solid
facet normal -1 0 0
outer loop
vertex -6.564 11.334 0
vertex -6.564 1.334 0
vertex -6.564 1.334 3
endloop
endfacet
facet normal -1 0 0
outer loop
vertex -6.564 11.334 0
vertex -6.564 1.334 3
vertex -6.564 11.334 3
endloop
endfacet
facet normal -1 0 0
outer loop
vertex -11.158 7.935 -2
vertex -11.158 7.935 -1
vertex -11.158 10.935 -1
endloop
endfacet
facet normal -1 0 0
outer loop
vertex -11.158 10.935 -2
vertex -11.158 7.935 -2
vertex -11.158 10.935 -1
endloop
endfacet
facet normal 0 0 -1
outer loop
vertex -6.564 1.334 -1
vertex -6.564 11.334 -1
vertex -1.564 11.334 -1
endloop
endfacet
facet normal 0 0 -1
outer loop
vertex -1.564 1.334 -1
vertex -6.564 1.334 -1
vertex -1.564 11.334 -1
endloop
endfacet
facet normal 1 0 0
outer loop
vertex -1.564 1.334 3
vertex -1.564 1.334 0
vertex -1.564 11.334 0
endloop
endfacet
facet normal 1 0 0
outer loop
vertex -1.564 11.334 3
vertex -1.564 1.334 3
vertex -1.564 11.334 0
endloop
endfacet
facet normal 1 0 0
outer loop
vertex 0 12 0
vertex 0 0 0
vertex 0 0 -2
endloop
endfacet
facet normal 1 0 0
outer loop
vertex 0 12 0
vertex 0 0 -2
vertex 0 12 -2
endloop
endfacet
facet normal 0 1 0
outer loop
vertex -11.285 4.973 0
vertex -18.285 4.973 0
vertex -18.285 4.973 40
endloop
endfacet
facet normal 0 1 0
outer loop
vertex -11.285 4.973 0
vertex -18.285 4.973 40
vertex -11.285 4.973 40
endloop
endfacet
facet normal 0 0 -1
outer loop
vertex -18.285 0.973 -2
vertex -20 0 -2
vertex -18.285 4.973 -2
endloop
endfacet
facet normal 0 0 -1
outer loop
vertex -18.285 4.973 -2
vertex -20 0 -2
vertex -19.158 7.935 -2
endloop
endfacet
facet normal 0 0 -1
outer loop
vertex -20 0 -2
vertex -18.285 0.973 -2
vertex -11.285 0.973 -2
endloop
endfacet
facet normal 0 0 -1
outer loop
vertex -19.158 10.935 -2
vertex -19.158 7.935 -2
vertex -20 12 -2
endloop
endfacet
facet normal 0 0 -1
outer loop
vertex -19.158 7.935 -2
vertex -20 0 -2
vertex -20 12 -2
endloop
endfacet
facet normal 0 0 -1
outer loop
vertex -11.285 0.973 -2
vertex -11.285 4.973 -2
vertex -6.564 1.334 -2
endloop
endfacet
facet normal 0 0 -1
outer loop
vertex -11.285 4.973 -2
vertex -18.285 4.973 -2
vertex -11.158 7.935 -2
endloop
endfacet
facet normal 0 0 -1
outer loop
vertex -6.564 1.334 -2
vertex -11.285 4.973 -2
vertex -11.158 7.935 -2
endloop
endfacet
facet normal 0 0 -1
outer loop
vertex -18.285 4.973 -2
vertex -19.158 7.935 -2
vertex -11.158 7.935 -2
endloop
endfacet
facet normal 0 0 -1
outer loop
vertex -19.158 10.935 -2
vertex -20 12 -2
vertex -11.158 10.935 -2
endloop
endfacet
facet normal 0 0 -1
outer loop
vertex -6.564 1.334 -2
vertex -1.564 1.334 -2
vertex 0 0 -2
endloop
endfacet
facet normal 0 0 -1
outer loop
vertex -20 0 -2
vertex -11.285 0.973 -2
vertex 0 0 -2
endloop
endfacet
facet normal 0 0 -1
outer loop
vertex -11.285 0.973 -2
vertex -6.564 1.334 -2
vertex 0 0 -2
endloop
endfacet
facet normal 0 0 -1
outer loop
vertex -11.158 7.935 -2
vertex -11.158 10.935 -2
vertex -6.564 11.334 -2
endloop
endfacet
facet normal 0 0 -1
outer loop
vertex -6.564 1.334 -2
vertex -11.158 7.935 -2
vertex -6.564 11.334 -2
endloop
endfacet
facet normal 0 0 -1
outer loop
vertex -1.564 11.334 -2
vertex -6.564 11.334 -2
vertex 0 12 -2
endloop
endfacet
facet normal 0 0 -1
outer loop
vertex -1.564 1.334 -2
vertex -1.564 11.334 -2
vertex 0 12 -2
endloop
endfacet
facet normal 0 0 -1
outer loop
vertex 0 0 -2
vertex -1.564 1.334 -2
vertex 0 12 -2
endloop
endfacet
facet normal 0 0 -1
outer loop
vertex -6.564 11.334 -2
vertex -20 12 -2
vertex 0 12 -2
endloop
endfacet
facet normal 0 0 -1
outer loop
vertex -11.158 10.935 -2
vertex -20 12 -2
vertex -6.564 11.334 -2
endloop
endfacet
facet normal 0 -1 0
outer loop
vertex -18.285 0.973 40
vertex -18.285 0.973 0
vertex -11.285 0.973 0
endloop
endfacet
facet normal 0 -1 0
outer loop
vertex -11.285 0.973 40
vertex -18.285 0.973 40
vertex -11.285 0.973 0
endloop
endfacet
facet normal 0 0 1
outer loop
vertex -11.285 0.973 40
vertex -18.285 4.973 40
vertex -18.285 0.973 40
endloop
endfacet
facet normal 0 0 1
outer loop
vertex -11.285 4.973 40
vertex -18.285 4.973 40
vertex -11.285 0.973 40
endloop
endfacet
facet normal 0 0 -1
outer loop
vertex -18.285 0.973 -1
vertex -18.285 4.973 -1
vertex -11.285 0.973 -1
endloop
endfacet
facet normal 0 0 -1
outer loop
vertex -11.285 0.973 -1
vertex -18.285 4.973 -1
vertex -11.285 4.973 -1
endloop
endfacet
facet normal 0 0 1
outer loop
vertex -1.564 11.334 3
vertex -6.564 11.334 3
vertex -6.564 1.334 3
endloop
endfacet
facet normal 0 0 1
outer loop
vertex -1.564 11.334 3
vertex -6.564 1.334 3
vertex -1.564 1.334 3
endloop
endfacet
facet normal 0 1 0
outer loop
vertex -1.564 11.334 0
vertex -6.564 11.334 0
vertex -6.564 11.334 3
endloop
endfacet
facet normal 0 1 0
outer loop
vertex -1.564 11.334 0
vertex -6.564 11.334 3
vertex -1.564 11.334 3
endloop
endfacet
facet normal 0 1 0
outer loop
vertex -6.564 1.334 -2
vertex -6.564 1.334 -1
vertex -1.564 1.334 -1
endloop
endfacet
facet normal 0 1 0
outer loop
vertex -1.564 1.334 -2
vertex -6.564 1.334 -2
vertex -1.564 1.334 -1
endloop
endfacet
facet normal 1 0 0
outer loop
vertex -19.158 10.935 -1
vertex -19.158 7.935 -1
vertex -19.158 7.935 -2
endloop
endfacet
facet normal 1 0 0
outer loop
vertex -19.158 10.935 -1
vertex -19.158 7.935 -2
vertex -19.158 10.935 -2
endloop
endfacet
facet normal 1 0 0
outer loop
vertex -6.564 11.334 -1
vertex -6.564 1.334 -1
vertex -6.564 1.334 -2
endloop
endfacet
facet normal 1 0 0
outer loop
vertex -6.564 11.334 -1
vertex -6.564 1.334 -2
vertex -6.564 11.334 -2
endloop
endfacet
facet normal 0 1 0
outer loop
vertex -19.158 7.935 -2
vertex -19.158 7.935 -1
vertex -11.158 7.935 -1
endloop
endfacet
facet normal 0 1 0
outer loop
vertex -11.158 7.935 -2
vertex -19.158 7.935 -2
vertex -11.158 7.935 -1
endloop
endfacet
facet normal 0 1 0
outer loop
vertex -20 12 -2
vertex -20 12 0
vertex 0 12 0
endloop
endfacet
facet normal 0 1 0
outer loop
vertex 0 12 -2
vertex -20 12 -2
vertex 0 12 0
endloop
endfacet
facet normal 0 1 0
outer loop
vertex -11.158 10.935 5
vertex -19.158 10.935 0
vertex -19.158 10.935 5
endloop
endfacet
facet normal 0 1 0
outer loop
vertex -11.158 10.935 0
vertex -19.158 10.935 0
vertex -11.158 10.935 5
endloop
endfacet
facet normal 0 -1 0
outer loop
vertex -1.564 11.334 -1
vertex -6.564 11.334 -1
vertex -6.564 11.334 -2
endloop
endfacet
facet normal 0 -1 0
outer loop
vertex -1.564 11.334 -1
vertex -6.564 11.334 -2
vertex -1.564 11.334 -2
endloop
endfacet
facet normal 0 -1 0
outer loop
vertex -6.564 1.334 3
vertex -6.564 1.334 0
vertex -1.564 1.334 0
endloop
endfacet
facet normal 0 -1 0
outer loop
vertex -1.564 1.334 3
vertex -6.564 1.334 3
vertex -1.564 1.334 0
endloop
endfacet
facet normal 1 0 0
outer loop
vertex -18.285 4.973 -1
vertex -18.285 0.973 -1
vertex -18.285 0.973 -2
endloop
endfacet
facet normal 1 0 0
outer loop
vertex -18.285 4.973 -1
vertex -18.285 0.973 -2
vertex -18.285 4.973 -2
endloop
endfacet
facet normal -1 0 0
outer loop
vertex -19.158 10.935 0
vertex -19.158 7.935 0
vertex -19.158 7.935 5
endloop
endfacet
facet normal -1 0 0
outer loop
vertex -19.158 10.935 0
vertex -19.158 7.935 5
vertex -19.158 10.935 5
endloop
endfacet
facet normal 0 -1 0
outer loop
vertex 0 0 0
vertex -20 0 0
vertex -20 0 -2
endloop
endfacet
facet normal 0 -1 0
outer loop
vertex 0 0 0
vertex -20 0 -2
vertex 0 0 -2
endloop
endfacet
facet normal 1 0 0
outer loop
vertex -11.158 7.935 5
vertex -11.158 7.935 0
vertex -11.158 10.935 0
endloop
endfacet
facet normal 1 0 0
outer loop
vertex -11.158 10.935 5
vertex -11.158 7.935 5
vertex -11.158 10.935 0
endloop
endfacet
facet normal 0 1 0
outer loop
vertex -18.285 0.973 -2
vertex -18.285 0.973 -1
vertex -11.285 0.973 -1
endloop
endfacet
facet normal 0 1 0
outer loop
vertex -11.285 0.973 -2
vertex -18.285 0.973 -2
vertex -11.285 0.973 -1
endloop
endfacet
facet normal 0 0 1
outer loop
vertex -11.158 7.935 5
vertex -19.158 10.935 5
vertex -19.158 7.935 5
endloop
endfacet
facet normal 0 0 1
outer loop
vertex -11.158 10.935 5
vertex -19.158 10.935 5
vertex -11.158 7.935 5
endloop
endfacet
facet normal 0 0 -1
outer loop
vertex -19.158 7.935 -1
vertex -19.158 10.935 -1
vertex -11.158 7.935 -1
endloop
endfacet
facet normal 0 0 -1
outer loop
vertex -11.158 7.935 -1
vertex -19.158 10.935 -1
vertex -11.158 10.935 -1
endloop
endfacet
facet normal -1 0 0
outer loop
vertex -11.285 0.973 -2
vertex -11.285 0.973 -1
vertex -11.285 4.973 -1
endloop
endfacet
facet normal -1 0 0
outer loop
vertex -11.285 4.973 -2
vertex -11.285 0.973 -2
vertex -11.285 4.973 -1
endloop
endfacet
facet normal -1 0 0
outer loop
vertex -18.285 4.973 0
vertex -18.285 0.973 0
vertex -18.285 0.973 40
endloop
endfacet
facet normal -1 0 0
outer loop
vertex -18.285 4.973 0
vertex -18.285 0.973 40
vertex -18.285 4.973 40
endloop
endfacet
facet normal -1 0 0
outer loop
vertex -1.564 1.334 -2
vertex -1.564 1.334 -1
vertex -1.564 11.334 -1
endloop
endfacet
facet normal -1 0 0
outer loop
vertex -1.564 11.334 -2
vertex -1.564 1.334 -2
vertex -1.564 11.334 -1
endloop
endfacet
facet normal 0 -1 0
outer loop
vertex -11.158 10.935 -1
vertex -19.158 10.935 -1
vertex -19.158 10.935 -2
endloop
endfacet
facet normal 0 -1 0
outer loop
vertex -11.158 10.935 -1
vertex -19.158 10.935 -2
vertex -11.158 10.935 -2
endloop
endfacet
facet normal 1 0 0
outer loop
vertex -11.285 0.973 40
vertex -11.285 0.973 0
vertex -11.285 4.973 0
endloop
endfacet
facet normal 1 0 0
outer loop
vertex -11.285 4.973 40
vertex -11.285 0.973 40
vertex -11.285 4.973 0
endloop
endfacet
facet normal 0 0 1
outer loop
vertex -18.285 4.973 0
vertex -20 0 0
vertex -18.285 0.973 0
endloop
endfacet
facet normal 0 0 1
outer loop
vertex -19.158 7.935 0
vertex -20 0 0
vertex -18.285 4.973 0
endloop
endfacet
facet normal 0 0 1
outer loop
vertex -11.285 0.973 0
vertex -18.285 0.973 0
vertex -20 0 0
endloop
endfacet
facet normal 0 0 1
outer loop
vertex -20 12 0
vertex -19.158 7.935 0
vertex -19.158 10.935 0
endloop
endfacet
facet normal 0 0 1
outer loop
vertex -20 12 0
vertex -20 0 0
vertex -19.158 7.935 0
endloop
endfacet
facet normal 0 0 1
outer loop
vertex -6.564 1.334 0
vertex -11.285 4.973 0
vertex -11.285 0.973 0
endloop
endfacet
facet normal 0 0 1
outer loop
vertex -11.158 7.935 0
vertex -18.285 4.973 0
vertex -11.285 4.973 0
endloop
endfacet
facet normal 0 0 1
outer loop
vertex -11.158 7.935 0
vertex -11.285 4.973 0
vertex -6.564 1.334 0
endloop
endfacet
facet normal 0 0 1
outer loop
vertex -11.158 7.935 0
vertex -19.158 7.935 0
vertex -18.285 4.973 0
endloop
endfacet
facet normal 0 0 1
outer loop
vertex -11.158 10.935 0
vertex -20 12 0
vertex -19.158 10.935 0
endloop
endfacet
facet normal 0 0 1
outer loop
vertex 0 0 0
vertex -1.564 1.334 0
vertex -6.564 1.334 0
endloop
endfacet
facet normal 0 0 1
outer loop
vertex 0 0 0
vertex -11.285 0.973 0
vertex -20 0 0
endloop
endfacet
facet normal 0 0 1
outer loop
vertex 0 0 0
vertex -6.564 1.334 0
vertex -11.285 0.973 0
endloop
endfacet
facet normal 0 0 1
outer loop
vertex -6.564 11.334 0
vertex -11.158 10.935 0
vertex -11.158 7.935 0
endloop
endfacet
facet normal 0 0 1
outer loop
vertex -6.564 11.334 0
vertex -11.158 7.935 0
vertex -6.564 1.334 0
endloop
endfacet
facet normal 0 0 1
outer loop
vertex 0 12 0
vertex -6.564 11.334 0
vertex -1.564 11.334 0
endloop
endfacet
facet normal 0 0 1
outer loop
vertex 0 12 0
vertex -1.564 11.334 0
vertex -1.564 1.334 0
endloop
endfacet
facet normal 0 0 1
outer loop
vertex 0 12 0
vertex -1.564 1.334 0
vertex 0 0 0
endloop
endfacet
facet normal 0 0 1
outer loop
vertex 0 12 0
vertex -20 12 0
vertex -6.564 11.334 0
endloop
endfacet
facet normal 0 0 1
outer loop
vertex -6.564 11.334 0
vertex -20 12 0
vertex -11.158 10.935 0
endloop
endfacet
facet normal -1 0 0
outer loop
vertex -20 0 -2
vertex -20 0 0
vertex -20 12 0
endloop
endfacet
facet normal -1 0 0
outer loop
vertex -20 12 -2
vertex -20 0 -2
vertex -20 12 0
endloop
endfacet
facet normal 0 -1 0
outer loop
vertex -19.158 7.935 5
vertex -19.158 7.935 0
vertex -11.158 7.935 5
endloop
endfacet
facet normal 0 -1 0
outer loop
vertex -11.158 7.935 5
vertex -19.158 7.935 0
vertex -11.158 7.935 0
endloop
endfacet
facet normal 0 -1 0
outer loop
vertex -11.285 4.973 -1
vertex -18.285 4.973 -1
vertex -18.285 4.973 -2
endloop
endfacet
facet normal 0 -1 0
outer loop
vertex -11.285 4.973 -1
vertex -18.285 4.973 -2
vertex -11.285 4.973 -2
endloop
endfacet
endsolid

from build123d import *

# Parameters (mm, degrees)
F0_W     = 8
F0_H     = 3
F1_DEPTH = 5
F0_W_2   = 7
F0_H_2   = 4
F2_DEPTH = 40
F0_W_3   = 5
F0_H_3   = 10
F3_DEPTH = 3
F0_W_4   = 20
F0_H_4   = 12
F4_DEPTH = 2
F5_DEPTH = 1


with BuildPart() as f1:
    # F0 (on Top) → F1 (new body)
    with BuildSketch(Plane.XY):
        with Locations((-15.1580379307, 9.4352371395)):
            Rectangle(F0_W, F0_H)
    extrude(amount=F1_DEPTH)



with BuildPart() as f2:
    # F0 (on Top) → F2 (new body)
    with BuildSketch(Plane.XY):
        with Locations((-14.7853907049, 2.9733350016)):
            Rectangle(F0_W_2, F0_H_2)
    extrude(amount=F2_DEPTH)


with BuildPart() as f3:
    # F0 (on Top) → F3 (new body)
    with BuildSketch(Plane.XY):
        with Locations((-4.0641951468, 6.3341652229)):
            Rectangle(F0_W_3, F0_H_3)
    extrude(amount=F3_DEPTH)


with BuildPart() as f1_1:
    add(f1.part)

    add(f2.part)  # F4 merges F2

    add(f3.part)  # F4 merges F3
    # F0 (on Top) → F4 (join)
    with BuildSketch(Plane.XY):
        with Locations((-10, 6)):
            Rectangle(F0_W_4, F0_H_4)
        with Locations((-14.7853907049, 2.9733350016)):
            Rectangle(F0_W_2, F0_H_2, mode=Mode.SUBTRACT)
        with Locations((-15.1580379307, 9.4352371395)):
            Rectangle(F0_W, F0_H, mode=Mode.SUBTRACT)
        with Locations((-4.0641951468, 6.3341652229)):
            Rectangle(F0_W_3, F0_H_3, mode=Mode.SUBTRACT)
    extrude(amount=-F4_DEPTH)

    # F0 (on Top) → F5 (join)
    with BuildSketch(Plane.XY):
        with Locations((-14.7853907049, 2.9733350016)):
            Rectangle(F0_W_2, F0_H_2)
        with Locations((-15.1580379307, 9.4352371395)):
            Rectangle(F0_W, F0_H)
        with Locations((-4.0641951468, 6.3341652229)):
            Rectangle(F0_W_3, F0_H_3)
    extrude(amount=-F5_DEPTH)


solid = f1_1.part
